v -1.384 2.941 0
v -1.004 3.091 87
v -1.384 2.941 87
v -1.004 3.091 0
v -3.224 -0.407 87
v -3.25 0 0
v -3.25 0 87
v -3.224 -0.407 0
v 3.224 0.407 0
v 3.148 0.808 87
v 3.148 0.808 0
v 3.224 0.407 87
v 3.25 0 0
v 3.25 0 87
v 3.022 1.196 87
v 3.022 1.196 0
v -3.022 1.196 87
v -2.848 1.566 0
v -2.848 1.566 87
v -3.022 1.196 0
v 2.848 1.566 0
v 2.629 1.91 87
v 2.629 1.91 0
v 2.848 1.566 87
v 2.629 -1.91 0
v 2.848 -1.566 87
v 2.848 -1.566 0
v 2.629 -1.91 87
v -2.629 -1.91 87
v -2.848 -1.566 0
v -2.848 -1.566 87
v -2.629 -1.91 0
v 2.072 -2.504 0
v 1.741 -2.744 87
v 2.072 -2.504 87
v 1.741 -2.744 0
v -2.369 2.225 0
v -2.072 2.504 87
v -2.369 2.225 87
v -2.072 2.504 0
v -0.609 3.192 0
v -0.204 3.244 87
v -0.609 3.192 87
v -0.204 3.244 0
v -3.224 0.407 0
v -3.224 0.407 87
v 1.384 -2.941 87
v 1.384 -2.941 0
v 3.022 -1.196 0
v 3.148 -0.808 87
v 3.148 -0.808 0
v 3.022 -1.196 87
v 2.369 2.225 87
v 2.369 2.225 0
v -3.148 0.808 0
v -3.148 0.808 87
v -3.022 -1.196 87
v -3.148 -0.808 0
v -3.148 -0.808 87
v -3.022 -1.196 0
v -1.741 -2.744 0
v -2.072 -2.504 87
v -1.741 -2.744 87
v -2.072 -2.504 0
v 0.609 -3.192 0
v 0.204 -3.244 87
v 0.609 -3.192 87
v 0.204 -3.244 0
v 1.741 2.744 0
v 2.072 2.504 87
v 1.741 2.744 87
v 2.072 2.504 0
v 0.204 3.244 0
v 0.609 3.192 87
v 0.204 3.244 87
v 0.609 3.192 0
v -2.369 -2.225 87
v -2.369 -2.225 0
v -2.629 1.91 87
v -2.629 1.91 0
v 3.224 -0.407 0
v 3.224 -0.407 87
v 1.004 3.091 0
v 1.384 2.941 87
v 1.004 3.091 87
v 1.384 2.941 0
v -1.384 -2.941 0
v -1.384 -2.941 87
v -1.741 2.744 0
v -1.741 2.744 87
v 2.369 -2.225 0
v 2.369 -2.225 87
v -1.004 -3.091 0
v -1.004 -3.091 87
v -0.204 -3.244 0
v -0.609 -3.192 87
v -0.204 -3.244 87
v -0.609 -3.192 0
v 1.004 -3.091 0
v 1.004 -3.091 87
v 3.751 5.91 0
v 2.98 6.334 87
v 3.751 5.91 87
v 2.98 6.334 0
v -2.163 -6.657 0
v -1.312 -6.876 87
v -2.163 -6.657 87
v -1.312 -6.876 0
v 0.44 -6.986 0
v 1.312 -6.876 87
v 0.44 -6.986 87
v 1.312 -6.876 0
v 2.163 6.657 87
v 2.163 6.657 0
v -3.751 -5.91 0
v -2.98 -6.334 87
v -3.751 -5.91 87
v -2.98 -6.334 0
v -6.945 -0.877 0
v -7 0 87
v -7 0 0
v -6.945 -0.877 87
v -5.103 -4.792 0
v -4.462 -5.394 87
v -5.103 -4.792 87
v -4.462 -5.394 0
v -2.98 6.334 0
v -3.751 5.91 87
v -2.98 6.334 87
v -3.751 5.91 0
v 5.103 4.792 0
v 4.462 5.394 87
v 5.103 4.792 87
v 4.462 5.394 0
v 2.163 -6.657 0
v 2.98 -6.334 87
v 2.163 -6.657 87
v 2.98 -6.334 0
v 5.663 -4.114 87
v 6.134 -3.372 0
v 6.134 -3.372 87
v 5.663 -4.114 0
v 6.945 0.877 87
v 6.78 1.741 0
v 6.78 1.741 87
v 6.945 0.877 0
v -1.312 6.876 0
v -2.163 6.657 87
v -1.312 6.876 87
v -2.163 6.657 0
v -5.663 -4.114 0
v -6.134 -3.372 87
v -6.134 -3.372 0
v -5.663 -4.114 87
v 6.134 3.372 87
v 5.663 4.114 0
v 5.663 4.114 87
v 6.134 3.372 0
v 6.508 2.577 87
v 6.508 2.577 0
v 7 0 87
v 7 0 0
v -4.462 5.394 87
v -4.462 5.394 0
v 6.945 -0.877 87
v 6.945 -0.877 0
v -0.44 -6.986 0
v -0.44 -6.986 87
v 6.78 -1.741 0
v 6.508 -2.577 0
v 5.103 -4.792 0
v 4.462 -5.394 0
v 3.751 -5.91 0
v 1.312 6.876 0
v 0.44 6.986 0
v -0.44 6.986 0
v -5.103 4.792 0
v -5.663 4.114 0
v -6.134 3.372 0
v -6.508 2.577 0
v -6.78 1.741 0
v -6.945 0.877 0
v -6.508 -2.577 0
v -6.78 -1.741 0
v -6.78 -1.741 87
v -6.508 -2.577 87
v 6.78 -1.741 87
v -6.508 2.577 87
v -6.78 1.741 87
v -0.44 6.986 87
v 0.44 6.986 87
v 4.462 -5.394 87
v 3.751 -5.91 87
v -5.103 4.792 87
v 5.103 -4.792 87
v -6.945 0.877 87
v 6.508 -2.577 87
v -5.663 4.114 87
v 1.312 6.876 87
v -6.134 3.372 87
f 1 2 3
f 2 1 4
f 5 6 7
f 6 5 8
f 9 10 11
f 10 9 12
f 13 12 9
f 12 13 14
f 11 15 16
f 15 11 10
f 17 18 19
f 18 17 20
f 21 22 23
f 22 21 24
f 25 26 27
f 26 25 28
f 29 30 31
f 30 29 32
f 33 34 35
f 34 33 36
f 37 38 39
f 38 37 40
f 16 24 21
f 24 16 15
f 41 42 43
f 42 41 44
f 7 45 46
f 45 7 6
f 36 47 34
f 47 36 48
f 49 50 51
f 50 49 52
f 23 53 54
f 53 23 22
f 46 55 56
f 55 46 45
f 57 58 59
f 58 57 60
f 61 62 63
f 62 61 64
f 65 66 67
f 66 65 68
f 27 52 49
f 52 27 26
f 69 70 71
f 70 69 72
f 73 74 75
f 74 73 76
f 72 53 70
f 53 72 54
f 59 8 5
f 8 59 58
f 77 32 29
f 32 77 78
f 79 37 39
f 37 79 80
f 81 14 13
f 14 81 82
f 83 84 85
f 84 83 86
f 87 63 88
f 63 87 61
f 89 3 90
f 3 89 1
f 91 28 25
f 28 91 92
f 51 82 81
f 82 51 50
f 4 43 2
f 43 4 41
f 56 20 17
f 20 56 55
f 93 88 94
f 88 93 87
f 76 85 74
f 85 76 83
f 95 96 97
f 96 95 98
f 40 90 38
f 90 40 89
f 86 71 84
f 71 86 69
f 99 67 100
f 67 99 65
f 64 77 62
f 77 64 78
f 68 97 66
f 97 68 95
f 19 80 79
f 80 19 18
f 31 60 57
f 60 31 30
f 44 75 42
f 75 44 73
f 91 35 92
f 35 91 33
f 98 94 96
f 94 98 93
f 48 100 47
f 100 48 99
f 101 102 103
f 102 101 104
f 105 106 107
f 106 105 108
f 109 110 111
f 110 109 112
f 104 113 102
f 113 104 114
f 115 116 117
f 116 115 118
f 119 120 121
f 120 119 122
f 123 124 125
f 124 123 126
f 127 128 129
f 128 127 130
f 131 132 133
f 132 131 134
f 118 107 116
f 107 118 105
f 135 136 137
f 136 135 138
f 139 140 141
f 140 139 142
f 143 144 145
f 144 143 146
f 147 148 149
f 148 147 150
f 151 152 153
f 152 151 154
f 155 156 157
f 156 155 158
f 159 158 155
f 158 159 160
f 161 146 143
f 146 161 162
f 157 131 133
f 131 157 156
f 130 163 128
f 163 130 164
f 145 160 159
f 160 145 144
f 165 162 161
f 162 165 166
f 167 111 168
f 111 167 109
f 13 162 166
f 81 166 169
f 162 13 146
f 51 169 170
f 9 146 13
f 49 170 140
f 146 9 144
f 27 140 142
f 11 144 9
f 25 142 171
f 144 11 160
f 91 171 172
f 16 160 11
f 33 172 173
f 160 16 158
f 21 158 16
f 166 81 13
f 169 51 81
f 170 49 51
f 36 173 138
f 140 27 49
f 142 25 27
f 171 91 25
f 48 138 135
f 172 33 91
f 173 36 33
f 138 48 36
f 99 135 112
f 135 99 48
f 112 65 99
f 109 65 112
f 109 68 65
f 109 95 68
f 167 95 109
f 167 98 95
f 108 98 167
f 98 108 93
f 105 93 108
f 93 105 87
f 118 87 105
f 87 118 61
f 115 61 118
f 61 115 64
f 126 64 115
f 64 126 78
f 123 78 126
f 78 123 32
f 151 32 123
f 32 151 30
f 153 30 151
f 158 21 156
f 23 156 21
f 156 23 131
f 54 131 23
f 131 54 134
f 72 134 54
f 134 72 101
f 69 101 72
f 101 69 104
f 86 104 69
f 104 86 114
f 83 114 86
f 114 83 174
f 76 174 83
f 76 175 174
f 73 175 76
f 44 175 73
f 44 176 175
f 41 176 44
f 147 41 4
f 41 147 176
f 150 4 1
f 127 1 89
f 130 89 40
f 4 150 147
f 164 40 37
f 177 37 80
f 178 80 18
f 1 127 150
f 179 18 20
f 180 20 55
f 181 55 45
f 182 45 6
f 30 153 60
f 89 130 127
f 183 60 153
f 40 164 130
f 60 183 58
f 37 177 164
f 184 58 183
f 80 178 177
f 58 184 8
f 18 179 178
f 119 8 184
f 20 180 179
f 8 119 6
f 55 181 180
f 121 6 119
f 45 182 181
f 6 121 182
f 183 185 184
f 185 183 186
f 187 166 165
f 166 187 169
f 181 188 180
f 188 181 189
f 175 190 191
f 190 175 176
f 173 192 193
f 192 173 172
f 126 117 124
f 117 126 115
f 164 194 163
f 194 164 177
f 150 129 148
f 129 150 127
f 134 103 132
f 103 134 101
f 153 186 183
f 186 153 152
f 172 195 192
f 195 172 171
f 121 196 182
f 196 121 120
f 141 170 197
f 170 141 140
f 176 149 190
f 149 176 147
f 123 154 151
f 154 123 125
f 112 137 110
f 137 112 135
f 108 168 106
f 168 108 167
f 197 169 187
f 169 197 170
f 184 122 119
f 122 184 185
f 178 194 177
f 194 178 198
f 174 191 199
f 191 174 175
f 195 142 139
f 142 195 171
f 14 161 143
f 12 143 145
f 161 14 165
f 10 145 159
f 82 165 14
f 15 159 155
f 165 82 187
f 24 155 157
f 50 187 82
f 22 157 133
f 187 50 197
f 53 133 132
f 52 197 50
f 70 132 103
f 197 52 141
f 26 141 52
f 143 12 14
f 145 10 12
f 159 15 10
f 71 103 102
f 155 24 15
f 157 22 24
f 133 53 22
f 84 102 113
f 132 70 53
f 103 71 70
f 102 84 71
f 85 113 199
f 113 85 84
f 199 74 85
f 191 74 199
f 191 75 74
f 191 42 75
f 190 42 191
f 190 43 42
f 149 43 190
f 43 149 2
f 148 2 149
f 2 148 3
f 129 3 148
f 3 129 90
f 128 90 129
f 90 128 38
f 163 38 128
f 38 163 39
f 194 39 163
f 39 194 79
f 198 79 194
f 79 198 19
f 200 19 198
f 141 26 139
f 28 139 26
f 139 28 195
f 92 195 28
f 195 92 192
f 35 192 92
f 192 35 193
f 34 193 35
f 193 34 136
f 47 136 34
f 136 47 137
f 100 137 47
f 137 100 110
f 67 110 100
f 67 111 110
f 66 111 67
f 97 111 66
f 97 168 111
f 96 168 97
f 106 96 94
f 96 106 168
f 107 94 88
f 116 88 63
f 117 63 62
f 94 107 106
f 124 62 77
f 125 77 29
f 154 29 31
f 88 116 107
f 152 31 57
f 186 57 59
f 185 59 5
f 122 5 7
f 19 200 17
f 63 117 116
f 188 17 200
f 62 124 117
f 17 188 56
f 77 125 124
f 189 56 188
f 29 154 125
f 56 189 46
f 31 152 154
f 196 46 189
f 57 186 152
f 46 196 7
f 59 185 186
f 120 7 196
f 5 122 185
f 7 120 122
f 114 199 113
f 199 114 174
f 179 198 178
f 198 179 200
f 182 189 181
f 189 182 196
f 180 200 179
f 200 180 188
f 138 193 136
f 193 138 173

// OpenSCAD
$fn = 50;


difference() {
	union() {
		*color(alpha = 1.0000000000, c = "gray") {
			translate(v = [0, 7, 0]) {
				linear_extrude(height = 1) {
					text(font = "Arial:style=Bold", halign = "center", size = 4.5000000000, text = "COMMENT plate main", valign = "center");
				}
			}
		}
		cylinder(h = 87, r = 7.0000000000);
	}
	union() {
		*color(alpha = 1.0000000000, c = "gray") {
			translate(v = [0, 7, 0]) {
				linear_extrude(height = 1) {
					text(font = "Arial:style=Bold", halign = "center", size = 4.5000000000, text = "COMMENT holes main", valign = "center");
				}
			}
		}
		translate(v = [0, 0, -100]) {
			cylinder(h = 200, r = 3.2500000000);
		}
		translate(v = [0, 0, -100]) {
			cylinder(h = 200, r = 1.8000000000);
		}
	}
}
